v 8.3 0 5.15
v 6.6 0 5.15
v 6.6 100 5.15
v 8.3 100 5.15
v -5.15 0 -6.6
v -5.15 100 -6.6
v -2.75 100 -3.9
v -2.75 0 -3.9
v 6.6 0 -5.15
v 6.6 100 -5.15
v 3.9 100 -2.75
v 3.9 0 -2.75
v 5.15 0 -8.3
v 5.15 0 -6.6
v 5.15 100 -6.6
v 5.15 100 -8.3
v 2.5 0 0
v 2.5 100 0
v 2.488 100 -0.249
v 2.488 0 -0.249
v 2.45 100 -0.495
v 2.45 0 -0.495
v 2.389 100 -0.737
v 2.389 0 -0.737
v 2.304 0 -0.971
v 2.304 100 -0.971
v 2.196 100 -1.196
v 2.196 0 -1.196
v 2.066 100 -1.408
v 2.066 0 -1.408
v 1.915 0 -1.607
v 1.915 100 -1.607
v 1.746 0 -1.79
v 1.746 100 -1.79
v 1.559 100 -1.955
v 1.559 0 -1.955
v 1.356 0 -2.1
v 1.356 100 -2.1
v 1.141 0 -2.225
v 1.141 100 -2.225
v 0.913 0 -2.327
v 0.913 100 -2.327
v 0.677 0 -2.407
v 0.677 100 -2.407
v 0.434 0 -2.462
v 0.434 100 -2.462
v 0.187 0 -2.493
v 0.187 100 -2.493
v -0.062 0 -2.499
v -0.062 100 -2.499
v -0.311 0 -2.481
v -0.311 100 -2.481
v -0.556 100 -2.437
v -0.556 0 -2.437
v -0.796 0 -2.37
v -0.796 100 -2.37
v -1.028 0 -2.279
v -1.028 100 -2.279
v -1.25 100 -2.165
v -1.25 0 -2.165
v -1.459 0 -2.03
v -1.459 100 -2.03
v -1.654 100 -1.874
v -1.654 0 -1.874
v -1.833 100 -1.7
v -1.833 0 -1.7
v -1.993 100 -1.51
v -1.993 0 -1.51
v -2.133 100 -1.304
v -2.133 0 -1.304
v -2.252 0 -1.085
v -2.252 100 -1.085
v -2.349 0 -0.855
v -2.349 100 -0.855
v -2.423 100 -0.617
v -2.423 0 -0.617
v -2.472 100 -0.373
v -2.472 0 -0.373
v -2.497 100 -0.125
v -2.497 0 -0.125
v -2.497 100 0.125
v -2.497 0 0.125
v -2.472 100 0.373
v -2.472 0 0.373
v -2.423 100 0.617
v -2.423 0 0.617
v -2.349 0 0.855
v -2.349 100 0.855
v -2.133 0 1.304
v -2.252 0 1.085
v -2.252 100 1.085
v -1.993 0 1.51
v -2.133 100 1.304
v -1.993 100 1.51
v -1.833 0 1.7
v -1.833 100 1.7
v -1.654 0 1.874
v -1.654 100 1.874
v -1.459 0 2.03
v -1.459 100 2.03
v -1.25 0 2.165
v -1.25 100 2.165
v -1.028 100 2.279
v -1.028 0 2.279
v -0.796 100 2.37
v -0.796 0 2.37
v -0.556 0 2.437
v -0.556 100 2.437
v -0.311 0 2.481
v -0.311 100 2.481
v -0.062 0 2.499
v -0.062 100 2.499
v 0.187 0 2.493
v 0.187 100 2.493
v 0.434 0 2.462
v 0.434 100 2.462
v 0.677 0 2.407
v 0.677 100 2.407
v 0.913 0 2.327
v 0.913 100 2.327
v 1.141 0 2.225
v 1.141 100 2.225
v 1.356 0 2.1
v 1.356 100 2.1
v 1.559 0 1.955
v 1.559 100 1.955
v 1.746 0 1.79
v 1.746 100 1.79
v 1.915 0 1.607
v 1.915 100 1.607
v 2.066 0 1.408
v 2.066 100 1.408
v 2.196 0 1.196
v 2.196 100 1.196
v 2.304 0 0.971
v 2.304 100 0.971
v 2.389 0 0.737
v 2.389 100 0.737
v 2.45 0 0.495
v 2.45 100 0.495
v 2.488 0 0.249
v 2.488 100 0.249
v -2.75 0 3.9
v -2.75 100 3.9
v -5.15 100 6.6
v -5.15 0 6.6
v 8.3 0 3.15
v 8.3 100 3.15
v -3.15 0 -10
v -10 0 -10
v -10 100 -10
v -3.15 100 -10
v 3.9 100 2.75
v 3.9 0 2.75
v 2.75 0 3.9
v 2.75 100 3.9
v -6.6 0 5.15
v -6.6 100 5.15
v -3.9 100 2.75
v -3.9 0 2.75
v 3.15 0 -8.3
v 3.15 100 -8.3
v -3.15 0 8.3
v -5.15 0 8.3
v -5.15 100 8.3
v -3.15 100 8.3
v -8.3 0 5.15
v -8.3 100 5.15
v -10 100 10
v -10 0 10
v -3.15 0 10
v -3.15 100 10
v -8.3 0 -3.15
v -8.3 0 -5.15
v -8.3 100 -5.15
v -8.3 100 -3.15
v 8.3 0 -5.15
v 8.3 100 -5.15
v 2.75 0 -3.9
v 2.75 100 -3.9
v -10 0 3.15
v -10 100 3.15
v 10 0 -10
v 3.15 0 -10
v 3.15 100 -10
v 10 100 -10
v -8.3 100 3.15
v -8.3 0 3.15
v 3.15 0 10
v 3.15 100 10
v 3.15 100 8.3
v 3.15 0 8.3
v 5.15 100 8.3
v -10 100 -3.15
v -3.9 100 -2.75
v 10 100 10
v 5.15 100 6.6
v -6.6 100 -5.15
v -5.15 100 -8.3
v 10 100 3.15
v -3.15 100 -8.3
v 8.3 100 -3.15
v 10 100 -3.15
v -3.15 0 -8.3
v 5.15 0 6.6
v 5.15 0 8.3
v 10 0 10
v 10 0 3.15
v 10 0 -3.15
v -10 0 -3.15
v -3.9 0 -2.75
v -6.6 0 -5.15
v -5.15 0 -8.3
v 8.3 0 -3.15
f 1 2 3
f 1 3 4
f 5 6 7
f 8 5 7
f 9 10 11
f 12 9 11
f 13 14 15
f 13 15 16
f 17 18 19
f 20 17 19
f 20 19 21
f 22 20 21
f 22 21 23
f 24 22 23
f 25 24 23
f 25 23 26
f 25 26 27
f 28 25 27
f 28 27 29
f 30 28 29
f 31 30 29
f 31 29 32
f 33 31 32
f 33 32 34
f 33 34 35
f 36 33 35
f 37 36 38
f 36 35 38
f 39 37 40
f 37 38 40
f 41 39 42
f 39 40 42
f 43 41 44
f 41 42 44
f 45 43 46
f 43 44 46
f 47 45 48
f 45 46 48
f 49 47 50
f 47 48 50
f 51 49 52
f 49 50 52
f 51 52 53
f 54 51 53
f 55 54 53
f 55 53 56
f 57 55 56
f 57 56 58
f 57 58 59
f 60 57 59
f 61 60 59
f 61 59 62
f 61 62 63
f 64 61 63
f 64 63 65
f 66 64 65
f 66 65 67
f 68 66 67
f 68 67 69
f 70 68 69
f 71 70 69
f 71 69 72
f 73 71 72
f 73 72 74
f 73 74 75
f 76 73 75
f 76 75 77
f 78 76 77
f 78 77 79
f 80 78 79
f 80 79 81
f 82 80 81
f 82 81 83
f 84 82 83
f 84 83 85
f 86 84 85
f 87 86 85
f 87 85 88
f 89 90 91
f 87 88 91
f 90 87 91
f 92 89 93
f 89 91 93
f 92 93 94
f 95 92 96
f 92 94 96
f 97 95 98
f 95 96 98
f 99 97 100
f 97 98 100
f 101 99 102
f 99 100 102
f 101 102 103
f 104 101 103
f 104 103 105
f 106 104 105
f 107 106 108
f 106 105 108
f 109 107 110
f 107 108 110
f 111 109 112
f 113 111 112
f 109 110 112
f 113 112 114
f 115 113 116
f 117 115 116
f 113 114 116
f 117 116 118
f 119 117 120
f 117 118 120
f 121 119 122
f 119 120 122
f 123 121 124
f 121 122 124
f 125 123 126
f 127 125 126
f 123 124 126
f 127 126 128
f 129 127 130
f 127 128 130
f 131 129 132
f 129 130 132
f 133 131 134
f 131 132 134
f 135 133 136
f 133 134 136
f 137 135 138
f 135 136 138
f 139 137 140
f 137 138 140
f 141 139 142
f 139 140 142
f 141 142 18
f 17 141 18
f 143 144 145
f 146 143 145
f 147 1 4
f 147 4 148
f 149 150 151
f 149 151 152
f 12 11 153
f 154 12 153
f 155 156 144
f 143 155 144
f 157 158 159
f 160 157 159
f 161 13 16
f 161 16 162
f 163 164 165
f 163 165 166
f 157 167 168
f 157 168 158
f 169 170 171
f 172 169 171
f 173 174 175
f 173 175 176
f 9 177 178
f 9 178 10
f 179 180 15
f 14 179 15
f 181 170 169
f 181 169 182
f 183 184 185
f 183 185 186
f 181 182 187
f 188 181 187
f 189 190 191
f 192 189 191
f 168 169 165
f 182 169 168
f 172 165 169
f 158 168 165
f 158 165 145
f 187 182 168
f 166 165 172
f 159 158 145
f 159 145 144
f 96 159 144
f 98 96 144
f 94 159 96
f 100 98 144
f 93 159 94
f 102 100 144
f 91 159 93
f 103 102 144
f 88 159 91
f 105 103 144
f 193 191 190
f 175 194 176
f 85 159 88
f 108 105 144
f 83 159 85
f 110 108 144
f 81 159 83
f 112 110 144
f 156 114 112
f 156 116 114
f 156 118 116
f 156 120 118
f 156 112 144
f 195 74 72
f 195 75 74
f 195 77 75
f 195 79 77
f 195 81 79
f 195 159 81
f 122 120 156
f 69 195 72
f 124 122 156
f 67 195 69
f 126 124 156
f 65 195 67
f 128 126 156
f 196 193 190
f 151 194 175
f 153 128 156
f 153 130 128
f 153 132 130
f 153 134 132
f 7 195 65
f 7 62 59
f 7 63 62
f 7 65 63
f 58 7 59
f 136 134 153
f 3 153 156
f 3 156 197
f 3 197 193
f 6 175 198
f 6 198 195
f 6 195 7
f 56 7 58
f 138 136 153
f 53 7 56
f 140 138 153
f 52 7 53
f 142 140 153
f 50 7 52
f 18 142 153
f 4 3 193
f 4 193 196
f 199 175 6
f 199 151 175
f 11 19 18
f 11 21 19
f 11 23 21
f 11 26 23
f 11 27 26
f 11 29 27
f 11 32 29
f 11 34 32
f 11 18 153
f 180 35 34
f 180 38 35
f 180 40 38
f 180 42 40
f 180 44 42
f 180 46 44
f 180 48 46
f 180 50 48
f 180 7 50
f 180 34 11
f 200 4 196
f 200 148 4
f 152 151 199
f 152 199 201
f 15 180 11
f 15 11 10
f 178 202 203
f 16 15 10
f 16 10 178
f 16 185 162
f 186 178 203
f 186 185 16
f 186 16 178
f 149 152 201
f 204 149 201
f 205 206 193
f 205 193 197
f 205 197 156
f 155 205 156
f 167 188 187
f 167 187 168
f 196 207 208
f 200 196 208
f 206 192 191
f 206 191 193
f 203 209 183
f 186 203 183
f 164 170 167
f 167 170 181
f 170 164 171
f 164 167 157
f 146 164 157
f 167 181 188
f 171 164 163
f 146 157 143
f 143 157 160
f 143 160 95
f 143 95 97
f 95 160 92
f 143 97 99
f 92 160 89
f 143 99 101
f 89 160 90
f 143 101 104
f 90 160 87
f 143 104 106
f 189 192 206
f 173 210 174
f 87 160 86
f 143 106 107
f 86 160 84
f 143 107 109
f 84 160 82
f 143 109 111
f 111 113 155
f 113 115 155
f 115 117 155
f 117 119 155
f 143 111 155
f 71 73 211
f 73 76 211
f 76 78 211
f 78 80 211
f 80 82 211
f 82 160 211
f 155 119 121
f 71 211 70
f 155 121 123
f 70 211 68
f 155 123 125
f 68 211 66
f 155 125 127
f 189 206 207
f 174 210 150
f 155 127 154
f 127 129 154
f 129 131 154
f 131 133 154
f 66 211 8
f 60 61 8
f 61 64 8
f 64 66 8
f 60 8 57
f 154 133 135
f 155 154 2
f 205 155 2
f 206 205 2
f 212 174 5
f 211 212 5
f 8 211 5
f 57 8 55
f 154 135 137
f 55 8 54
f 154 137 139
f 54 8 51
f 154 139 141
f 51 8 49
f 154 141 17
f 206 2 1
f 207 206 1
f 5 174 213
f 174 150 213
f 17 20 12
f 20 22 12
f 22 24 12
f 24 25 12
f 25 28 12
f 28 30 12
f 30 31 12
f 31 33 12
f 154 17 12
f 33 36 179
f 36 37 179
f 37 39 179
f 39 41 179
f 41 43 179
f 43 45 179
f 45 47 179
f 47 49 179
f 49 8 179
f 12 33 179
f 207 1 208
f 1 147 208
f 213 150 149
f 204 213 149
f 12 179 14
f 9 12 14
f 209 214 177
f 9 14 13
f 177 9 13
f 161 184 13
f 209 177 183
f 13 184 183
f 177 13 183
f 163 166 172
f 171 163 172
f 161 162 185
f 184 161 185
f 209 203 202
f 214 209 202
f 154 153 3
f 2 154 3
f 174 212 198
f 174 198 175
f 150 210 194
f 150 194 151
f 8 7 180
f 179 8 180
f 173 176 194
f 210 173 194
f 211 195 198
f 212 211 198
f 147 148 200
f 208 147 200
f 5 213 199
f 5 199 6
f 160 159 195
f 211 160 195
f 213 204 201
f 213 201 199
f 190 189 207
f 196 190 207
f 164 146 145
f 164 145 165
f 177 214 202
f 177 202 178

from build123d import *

# Parameters (mm, degrees)
SKETCH_1_W          = 20
SKETCH_1_H          = 20
EXTRUDE_1_DEPTH     = 100
SKETCH_2_R          = 2.5
CUT_EXTRUDE_1_DEPTH = 101


with BuildPart() as part:
    # 草图1 → 凸台-拉伸1 (new body)
    with BuildSketch(Plane(origin=(0, 0, 0), x_dir=(1, 0, 0), z_dir=(0, 1, 0))):
        Rectangle(SKETCH_1_W, SKETCH_1_H)
    extrude(amount=EXTRUDE_1_DEPTH)

    # 草图2 → 切除-拉伸1 (cut, through all)
    with BuildSketch(Plane(origin=(0, 100, 0), x_dir=(1, 0, 0), z_dir=(0, 1, 0))):
        Circle(SKETCH_2_R)
        Polygon((-3.15, 10), (-3.15, 8.3), (-5.15, 8.3), (-5.15, 6.6), (-2.75, 3.9), (2.75, 3.9), (5.15, 6.6), (5.15, 8.3), (3.15, 8.3), (3.15, 10), align=None)
        Polygon((3.9, 2.75), (3.9, -2.75), (6.6, -5.15), (8.3, -5.15), (8.3, -3.15), (10, -3.15), (10, 3.15), (8.3, 3.15), (8.3, 5.15), (6.6, 5.15), align=None)
        Polygon((2.75, -3.9), (-2.75, -3.9), (-5.15, -6.6), (-5.15, -8.3), (-3.15, -8.3), (-3.15, -10), (3.15, -10), (3.15, -8.3), (5.15, -8.3), (5.15, -6.6), align=None)
        Polygon((-3.9, -2.75), (-3.9, 2.75), (-6.6, 5.15), (-8.3, 5.15), (-8.3, 3.15), (-10, 3.15), (-10, -3.15), (-8.3, -3.15), (-8.3, -5.15), (-6.6, -5.15), align=None)
    extrude(amount=-CUT_EXTRUDE_1_DEPTH, mode=Mode.SUBTRACT)


solid = part.part
